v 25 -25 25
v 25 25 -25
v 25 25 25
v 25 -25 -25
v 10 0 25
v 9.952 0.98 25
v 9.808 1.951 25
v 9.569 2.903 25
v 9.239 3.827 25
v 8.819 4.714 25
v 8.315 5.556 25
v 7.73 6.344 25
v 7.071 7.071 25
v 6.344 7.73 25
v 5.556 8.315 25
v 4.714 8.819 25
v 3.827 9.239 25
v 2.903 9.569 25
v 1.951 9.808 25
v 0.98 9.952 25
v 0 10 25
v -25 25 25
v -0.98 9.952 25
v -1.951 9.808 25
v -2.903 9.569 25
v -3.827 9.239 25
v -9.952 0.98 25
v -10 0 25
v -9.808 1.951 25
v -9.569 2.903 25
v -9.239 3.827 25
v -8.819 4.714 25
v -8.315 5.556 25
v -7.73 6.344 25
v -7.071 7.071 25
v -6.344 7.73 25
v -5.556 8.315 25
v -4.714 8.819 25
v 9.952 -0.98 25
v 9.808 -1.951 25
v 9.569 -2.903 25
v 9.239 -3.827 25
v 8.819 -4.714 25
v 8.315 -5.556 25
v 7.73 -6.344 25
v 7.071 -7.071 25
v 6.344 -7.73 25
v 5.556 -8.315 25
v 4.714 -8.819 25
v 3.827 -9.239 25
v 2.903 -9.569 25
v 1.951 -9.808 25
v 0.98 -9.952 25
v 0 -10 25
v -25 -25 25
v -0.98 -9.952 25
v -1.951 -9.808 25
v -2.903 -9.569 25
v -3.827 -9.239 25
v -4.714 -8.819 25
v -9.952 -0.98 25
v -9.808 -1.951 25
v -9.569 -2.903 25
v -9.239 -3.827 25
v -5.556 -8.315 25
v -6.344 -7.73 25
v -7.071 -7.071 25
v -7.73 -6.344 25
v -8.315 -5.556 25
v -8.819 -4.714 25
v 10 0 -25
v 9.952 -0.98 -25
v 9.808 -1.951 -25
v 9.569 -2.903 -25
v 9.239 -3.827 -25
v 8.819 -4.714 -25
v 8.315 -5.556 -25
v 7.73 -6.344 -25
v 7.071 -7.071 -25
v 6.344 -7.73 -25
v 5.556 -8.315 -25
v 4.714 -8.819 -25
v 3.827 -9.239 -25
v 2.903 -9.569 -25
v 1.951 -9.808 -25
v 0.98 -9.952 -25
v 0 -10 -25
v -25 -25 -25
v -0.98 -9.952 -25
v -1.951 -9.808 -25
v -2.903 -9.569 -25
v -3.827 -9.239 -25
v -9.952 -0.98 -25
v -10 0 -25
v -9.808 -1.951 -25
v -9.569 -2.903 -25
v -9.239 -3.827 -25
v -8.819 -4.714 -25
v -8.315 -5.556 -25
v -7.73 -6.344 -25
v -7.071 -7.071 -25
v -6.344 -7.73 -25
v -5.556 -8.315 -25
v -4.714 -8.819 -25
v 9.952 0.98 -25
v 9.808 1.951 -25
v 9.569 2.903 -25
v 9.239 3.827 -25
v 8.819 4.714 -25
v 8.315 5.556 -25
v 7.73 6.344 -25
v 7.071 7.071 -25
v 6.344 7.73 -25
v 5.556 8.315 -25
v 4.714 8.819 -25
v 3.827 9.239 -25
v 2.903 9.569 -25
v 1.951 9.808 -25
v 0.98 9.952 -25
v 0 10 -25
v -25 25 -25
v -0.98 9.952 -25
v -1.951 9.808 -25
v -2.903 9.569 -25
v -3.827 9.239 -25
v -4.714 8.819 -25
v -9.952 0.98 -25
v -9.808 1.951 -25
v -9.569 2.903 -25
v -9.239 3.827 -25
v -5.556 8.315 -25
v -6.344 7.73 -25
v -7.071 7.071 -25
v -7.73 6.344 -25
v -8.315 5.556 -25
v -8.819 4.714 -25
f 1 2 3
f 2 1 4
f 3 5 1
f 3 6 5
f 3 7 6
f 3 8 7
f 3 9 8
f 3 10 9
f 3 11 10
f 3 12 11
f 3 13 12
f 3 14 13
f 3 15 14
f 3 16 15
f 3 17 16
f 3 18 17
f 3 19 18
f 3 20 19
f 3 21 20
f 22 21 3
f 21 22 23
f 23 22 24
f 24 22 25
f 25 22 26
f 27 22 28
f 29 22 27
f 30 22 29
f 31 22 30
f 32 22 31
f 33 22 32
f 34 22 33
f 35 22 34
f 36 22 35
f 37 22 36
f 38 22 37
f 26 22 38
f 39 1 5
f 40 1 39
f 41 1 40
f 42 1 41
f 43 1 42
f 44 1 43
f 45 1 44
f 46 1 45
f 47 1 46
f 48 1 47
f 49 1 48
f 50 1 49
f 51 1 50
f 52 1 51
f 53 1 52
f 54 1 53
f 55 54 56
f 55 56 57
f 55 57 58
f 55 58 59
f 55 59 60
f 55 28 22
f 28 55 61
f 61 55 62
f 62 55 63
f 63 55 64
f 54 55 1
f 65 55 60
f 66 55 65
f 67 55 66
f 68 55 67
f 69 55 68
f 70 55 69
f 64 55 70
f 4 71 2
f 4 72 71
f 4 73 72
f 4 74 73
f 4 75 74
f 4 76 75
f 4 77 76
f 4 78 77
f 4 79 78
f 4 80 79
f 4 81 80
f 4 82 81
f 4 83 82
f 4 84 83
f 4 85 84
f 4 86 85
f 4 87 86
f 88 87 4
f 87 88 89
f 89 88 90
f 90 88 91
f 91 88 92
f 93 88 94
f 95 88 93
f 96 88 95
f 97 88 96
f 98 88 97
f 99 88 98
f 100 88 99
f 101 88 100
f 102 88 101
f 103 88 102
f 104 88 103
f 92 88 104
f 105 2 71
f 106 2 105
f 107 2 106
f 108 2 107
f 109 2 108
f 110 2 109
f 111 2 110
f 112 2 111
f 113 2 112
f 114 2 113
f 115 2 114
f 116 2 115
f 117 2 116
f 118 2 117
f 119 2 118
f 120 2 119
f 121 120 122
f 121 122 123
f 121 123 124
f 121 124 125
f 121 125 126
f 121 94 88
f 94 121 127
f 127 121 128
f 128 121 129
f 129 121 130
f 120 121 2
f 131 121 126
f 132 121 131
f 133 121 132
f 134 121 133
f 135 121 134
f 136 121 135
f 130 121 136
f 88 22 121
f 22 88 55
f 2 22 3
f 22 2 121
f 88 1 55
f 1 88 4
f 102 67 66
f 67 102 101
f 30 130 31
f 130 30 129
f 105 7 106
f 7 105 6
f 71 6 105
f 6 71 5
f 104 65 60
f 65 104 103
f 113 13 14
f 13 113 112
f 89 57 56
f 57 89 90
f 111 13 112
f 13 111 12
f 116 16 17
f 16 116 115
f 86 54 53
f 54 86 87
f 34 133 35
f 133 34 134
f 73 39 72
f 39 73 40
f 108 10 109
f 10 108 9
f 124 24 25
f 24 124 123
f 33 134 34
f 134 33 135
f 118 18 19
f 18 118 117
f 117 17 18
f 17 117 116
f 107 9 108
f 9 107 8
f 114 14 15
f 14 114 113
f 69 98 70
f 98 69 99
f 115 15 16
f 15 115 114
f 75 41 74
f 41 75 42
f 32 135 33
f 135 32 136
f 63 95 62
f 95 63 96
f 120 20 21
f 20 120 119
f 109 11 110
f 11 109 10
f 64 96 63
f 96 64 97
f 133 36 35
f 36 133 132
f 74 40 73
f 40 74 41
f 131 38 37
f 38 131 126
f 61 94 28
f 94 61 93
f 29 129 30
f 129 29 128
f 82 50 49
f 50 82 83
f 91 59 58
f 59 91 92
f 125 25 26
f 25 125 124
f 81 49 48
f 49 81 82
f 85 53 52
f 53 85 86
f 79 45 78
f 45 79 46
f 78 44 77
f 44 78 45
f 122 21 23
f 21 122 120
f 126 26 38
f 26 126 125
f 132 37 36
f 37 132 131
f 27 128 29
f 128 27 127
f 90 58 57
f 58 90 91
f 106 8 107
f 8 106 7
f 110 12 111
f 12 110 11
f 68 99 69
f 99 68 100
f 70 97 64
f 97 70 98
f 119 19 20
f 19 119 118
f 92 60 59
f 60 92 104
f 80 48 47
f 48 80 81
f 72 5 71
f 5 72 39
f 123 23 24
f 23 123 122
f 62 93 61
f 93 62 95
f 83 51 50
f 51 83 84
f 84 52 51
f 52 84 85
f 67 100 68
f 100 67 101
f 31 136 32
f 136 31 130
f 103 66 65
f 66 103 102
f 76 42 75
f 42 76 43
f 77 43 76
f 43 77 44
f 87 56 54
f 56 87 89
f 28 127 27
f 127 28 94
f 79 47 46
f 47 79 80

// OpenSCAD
difference() {
    cube([50, 50, 50], center = true);
    cylinder(h = 60, r = 10, center = true, $fn = 64);
}
